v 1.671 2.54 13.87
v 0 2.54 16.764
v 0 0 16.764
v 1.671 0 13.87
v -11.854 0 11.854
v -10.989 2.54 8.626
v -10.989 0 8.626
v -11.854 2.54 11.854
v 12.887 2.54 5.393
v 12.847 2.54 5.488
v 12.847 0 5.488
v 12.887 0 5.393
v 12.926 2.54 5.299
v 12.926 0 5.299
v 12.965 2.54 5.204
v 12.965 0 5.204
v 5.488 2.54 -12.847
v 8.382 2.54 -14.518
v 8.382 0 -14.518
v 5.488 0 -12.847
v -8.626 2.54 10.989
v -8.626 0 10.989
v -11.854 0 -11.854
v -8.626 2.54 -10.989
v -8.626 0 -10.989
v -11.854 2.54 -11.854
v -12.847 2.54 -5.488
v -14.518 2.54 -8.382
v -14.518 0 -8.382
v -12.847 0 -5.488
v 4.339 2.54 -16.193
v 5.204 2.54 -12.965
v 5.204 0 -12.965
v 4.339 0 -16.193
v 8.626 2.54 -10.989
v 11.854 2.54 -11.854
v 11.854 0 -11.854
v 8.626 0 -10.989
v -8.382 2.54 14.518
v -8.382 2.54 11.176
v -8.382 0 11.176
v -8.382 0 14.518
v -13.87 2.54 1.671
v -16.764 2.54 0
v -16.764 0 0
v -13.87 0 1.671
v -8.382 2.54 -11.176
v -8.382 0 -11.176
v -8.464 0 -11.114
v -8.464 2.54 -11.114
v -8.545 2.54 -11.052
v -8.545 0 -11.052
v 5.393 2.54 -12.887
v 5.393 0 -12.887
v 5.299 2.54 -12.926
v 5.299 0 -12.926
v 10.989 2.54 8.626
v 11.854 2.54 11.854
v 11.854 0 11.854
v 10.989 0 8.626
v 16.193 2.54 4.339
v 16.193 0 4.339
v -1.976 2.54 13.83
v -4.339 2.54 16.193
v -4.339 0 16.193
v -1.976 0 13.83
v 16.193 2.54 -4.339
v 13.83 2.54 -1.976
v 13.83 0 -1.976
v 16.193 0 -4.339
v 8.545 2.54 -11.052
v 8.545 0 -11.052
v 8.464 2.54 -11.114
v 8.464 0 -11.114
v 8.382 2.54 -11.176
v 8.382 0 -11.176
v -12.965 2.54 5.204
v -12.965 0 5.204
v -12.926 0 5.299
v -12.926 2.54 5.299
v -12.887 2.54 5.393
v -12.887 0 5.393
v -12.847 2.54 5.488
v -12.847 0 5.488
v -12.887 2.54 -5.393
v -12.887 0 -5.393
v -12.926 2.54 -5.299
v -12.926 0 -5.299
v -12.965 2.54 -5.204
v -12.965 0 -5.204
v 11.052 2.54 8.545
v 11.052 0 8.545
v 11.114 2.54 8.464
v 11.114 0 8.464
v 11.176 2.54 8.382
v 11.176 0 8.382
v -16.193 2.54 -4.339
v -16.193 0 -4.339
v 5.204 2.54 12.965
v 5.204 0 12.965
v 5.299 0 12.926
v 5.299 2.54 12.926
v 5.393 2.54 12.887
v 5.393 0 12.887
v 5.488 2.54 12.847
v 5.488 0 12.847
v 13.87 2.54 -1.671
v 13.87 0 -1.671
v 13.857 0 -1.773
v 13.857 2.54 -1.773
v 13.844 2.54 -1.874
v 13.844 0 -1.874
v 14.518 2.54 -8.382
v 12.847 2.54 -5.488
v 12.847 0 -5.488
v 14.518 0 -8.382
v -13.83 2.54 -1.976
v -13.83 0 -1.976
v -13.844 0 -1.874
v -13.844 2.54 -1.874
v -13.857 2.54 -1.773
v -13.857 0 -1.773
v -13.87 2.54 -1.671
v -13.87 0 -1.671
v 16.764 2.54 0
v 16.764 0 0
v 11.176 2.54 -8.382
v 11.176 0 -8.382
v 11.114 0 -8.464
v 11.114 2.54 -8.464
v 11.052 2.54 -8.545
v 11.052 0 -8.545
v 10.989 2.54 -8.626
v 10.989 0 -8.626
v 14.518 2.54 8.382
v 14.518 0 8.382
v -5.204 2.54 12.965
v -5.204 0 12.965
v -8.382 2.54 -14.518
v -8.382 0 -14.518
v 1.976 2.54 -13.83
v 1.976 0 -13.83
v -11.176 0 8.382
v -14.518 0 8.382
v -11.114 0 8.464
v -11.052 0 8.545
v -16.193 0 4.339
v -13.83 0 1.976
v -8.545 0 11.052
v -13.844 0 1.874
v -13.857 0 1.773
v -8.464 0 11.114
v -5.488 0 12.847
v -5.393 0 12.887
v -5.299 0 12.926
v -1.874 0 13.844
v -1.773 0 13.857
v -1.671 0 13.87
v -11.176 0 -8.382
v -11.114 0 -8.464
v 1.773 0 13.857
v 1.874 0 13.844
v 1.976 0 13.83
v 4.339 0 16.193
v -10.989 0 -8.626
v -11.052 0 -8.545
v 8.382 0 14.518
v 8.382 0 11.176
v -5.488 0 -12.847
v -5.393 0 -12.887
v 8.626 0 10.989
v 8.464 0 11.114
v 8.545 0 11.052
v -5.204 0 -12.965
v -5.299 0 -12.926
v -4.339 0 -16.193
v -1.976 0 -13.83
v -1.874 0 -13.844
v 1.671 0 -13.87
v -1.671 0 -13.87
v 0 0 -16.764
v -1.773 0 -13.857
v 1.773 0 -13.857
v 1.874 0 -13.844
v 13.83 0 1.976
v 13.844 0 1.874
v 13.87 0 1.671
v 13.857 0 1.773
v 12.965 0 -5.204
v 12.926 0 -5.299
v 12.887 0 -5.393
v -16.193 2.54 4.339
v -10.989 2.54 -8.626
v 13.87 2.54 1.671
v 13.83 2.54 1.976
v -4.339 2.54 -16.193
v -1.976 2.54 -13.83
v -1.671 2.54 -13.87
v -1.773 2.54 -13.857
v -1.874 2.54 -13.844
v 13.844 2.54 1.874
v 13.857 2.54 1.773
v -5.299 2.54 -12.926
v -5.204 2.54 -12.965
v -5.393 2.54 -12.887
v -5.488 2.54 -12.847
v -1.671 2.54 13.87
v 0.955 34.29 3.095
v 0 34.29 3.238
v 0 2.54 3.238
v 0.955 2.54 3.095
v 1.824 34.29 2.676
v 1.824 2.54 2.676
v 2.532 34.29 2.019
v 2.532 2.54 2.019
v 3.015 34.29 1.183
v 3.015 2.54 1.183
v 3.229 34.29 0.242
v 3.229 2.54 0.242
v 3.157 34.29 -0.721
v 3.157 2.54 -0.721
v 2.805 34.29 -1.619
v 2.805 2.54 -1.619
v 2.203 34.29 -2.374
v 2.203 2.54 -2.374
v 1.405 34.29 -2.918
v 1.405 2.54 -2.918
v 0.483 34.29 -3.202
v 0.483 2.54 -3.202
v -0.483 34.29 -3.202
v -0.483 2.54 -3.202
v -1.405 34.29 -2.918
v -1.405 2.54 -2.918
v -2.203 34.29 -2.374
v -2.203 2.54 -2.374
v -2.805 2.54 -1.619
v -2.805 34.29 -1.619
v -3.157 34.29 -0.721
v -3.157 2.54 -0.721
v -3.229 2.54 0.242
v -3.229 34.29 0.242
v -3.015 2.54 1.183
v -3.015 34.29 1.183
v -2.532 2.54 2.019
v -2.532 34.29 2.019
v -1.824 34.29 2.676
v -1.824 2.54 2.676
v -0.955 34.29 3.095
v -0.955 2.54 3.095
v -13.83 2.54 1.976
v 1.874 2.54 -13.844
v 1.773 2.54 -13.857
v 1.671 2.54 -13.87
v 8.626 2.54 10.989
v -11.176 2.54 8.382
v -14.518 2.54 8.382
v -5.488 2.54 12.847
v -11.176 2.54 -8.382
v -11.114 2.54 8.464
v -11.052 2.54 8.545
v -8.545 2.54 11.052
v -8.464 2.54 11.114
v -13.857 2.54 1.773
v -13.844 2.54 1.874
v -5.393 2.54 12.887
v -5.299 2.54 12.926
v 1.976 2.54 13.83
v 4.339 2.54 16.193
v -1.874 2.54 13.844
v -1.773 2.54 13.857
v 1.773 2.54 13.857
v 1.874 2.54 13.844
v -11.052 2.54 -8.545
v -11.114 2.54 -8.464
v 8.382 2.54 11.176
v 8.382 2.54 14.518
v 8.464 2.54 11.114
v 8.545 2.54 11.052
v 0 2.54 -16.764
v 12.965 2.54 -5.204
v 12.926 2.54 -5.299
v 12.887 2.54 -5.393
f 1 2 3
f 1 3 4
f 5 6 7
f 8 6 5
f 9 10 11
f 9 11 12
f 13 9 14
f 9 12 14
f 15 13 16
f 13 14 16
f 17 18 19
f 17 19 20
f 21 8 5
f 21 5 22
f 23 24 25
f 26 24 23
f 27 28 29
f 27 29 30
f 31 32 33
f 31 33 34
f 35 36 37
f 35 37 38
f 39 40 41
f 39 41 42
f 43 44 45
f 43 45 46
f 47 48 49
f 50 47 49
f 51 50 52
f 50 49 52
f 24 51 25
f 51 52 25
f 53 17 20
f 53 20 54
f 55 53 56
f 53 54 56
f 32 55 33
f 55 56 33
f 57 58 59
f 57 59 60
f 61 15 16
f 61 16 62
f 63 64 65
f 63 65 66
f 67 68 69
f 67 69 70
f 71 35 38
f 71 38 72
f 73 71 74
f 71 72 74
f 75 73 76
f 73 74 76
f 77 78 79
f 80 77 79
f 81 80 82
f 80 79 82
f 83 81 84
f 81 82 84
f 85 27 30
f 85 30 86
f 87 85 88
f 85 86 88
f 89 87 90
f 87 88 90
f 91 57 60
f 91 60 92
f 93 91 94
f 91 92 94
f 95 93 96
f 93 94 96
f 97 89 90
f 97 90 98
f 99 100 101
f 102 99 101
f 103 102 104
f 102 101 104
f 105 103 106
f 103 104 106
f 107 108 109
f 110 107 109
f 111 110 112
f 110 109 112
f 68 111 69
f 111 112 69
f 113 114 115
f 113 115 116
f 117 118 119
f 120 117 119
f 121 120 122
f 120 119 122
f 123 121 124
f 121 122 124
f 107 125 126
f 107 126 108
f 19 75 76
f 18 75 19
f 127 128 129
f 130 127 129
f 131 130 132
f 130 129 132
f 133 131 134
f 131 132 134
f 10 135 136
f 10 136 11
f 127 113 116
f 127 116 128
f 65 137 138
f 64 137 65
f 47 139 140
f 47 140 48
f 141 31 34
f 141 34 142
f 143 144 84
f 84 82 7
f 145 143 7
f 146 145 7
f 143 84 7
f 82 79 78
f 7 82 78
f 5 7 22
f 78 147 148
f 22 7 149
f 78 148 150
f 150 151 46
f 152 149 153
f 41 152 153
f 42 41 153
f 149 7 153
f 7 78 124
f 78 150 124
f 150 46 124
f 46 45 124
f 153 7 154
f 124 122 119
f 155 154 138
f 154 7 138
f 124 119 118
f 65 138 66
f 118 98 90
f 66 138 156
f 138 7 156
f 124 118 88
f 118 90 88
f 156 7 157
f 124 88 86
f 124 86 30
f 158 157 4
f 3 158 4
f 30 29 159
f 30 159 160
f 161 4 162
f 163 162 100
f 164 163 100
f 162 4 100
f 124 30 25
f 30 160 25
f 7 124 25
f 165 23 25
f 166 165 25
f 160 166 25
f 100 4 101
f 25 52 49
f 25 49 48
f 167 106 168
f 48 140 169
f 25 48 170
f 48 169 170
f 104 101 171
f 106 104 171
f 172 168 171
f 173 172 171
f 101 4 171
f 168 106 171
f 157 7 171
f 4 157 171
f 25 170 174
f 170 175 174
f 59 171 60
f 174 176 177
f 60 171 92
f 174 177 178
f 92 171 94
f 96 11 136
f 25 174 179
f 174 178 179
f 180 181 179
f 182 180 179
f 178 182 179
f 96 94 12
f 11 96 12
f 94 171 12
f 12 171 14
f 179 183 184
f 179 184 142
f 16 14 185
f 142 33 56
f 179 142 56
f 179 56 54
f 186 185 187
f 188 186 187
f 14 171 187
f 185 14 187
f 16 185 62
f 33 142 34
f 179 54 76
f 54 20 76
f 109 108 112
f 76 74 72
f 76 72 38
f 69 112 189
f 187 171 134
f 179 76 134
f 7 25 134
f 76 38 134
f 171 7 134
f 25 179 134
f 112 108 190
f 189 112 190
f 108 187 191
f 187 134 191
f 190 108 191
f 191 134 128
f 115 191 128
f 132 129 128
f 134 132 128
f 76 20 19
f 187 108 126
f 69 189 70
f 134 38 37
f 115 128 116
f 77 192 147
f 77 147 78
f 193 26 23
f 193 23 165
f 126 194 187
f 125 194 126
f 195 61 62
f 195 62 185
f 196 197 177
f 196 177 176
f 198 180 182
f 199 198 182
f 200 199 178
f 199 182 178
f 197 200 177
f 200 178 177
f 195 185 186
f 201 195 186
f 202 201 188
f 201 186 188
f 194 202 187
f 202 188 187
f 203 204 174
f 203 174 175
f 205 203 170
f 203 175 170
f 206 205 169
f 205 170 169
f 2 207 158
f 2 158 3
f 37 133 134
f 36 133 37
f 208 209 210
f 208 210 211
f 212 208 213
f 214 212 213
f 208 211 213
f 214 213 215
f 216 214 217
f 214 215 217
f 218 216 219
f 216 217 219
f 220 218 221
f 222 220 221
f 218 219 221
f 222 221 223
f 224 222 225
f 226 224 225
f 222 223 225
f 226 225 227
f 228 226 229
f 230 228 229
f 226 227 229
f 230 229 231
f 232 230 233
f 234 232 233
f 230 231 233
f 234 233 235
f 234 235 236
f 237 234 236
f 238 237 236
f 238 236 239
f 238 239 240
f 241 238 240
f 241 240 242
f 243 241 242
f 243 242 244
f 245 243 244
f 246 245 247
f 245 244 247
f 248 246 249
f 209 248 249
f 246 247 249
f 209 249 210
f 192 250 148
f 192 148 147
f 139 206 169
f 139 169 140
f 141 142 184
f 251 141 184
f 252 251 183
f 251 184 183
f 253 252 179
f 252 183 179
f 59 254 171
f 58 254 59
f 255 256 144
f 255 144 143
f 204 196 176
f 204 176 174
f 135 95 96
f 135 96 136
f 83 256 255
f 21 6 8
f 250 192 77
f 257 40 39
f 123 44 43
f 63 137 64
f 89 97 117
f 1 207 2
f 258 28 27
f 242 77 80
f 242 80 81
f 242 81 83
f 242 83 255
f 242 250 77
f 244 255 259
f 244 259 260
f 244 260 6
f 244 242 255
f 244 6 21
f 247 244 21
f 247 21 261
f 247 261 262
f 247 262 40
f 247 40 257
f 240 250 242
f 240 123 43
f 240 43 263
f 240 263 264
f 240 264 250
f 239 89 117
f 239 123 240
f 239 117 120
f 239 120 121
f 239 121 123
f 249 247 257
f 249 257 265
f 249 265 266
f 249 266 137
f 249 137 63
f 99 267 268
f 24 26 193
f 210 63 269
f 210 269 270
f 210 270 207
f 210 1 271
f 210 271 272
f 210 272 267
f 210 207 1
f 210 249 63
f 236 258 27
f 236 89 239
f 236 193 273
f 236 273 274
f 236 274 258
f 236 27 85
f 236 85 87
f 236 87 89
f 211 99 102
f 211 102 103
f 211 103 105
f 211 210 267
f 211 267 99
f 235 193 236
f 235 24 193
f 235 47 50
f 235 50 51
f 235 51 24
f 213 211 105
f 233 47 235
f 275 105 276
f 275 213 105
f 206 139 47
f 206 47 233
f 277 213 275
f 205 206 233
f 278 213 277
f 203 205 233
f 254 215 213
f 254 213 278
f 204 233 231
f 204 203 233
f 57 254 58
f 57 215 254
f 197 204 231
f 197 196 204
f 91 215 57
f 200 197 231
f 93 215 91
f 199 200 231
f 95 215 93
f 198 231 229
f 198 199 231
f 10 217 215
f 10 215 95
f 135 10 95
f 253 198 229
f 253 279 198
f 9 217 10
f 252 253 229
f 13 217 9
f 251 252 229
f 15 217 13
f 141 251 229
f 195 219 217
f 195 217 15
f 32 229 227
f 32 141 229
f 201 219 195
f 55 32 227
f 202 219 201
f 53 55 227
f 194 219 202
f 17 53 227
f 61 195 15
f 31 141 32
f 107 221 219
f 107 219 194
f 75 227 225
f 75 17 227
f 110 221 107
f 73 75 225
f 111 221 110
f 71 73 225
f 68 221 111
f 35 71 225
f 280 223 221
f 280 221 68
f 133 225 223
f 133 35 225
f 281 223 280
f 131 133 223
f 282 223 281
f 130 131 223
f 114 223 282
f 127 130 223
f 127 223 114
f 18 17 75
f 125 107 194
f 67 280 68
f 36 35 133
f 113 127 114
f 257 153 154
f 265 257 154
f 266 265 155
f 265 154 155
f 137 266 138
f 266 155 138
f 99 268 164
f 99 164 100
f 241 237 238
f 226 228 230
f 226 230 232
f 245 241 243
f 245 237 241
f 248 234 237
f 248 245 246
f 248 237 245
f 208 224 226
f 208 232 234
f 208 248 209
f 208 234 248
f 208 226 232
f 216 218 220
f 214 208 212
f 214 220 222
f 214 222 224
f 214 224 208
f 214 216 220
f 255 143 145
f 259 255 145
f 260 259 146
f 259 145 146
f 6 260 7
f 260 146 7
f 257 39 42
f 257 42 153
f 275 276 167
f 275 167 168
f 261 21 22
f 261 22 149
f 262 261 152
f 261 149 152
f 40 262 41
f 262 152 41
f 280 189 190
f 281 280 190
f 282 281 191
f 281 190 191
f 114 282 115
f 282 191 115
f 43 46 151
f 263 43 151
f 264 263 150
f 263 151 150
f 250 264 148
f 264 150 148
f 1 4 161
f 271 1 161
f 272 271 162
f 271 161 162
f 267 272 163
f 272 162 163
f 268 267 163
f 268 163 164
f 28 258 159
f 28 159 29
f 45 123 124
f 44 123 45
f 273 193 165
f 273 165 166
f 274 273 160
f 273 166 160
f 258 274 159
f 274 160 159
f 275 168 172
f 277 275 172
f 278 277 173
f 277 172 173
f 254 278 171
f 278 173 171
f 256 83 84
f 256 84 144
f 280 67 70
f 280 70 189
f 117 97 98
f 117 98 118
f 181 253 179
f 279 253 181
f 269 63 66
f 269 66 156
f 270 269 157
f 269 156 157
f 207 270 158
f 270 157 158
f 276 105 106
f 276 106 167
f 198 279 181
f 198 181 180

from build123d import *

# Parameters (mm, degrees)
SKETCH1_R           = 13.97
BOSS_EXTRUDE1_DEPTH = 2.54
BOSS_EXTRUDE2_DEPTH = 2.54
CIRPATTERN1_COUNT   = 24
SKETCH3_R           = 3.2385
BOSS_EXTRUDE3_DEPTH = 31.75


with BuildPart() as part:
    # Sketch1 → Boss-Extrude1 (new body)
    with BuildSketch(Plane(origin=(0, 0, 0), x_dir=(1, 0, 0), z_dir=(0, 1, 0))):
        Circle(SKETCH1_R)
    extrude(amount=BOSS_EXTRUDE1_DEPTH)

    # Sketch2 → Boss-Extrude2 (add)
    with BuildSketch(Plane(origin=(0, 2.54, 0), x_dir=(1, 0, 0), z_dir=(0, 1, 0))):
        Polygon((0, -16.764), (3.64730005, -10.446691002), (-3.581879589, -10.560002566), align=None)
    boss_extrude2 = extrude(amount=-BOSS_EXTRUDE2_DEPTH)

    # CirPattern1: Boss-Extrude2 ×24 about axis
    cirpattern1_axis = Axis((0, 2.667, 0), (0, -1, 0))
    for i in range(1, CIRPATTERN1_COUNT):
        add(boss_extrude2.rotate(cirpattern1_axis, i * 360 / CIRPATTERN1_COUNT))

    # Sketch3 → Boss-Extrude3 (add)
    with BuildSketch(Plane(origin=(0, 2.54, 0), x_dir=(1, 0, 0), z_dir=(0, 1, 0))):
        Circle(SKETCH3_R)
    extrude(amount=BOSS_EXTRUDE3_DEPTH)


solid = part.part
